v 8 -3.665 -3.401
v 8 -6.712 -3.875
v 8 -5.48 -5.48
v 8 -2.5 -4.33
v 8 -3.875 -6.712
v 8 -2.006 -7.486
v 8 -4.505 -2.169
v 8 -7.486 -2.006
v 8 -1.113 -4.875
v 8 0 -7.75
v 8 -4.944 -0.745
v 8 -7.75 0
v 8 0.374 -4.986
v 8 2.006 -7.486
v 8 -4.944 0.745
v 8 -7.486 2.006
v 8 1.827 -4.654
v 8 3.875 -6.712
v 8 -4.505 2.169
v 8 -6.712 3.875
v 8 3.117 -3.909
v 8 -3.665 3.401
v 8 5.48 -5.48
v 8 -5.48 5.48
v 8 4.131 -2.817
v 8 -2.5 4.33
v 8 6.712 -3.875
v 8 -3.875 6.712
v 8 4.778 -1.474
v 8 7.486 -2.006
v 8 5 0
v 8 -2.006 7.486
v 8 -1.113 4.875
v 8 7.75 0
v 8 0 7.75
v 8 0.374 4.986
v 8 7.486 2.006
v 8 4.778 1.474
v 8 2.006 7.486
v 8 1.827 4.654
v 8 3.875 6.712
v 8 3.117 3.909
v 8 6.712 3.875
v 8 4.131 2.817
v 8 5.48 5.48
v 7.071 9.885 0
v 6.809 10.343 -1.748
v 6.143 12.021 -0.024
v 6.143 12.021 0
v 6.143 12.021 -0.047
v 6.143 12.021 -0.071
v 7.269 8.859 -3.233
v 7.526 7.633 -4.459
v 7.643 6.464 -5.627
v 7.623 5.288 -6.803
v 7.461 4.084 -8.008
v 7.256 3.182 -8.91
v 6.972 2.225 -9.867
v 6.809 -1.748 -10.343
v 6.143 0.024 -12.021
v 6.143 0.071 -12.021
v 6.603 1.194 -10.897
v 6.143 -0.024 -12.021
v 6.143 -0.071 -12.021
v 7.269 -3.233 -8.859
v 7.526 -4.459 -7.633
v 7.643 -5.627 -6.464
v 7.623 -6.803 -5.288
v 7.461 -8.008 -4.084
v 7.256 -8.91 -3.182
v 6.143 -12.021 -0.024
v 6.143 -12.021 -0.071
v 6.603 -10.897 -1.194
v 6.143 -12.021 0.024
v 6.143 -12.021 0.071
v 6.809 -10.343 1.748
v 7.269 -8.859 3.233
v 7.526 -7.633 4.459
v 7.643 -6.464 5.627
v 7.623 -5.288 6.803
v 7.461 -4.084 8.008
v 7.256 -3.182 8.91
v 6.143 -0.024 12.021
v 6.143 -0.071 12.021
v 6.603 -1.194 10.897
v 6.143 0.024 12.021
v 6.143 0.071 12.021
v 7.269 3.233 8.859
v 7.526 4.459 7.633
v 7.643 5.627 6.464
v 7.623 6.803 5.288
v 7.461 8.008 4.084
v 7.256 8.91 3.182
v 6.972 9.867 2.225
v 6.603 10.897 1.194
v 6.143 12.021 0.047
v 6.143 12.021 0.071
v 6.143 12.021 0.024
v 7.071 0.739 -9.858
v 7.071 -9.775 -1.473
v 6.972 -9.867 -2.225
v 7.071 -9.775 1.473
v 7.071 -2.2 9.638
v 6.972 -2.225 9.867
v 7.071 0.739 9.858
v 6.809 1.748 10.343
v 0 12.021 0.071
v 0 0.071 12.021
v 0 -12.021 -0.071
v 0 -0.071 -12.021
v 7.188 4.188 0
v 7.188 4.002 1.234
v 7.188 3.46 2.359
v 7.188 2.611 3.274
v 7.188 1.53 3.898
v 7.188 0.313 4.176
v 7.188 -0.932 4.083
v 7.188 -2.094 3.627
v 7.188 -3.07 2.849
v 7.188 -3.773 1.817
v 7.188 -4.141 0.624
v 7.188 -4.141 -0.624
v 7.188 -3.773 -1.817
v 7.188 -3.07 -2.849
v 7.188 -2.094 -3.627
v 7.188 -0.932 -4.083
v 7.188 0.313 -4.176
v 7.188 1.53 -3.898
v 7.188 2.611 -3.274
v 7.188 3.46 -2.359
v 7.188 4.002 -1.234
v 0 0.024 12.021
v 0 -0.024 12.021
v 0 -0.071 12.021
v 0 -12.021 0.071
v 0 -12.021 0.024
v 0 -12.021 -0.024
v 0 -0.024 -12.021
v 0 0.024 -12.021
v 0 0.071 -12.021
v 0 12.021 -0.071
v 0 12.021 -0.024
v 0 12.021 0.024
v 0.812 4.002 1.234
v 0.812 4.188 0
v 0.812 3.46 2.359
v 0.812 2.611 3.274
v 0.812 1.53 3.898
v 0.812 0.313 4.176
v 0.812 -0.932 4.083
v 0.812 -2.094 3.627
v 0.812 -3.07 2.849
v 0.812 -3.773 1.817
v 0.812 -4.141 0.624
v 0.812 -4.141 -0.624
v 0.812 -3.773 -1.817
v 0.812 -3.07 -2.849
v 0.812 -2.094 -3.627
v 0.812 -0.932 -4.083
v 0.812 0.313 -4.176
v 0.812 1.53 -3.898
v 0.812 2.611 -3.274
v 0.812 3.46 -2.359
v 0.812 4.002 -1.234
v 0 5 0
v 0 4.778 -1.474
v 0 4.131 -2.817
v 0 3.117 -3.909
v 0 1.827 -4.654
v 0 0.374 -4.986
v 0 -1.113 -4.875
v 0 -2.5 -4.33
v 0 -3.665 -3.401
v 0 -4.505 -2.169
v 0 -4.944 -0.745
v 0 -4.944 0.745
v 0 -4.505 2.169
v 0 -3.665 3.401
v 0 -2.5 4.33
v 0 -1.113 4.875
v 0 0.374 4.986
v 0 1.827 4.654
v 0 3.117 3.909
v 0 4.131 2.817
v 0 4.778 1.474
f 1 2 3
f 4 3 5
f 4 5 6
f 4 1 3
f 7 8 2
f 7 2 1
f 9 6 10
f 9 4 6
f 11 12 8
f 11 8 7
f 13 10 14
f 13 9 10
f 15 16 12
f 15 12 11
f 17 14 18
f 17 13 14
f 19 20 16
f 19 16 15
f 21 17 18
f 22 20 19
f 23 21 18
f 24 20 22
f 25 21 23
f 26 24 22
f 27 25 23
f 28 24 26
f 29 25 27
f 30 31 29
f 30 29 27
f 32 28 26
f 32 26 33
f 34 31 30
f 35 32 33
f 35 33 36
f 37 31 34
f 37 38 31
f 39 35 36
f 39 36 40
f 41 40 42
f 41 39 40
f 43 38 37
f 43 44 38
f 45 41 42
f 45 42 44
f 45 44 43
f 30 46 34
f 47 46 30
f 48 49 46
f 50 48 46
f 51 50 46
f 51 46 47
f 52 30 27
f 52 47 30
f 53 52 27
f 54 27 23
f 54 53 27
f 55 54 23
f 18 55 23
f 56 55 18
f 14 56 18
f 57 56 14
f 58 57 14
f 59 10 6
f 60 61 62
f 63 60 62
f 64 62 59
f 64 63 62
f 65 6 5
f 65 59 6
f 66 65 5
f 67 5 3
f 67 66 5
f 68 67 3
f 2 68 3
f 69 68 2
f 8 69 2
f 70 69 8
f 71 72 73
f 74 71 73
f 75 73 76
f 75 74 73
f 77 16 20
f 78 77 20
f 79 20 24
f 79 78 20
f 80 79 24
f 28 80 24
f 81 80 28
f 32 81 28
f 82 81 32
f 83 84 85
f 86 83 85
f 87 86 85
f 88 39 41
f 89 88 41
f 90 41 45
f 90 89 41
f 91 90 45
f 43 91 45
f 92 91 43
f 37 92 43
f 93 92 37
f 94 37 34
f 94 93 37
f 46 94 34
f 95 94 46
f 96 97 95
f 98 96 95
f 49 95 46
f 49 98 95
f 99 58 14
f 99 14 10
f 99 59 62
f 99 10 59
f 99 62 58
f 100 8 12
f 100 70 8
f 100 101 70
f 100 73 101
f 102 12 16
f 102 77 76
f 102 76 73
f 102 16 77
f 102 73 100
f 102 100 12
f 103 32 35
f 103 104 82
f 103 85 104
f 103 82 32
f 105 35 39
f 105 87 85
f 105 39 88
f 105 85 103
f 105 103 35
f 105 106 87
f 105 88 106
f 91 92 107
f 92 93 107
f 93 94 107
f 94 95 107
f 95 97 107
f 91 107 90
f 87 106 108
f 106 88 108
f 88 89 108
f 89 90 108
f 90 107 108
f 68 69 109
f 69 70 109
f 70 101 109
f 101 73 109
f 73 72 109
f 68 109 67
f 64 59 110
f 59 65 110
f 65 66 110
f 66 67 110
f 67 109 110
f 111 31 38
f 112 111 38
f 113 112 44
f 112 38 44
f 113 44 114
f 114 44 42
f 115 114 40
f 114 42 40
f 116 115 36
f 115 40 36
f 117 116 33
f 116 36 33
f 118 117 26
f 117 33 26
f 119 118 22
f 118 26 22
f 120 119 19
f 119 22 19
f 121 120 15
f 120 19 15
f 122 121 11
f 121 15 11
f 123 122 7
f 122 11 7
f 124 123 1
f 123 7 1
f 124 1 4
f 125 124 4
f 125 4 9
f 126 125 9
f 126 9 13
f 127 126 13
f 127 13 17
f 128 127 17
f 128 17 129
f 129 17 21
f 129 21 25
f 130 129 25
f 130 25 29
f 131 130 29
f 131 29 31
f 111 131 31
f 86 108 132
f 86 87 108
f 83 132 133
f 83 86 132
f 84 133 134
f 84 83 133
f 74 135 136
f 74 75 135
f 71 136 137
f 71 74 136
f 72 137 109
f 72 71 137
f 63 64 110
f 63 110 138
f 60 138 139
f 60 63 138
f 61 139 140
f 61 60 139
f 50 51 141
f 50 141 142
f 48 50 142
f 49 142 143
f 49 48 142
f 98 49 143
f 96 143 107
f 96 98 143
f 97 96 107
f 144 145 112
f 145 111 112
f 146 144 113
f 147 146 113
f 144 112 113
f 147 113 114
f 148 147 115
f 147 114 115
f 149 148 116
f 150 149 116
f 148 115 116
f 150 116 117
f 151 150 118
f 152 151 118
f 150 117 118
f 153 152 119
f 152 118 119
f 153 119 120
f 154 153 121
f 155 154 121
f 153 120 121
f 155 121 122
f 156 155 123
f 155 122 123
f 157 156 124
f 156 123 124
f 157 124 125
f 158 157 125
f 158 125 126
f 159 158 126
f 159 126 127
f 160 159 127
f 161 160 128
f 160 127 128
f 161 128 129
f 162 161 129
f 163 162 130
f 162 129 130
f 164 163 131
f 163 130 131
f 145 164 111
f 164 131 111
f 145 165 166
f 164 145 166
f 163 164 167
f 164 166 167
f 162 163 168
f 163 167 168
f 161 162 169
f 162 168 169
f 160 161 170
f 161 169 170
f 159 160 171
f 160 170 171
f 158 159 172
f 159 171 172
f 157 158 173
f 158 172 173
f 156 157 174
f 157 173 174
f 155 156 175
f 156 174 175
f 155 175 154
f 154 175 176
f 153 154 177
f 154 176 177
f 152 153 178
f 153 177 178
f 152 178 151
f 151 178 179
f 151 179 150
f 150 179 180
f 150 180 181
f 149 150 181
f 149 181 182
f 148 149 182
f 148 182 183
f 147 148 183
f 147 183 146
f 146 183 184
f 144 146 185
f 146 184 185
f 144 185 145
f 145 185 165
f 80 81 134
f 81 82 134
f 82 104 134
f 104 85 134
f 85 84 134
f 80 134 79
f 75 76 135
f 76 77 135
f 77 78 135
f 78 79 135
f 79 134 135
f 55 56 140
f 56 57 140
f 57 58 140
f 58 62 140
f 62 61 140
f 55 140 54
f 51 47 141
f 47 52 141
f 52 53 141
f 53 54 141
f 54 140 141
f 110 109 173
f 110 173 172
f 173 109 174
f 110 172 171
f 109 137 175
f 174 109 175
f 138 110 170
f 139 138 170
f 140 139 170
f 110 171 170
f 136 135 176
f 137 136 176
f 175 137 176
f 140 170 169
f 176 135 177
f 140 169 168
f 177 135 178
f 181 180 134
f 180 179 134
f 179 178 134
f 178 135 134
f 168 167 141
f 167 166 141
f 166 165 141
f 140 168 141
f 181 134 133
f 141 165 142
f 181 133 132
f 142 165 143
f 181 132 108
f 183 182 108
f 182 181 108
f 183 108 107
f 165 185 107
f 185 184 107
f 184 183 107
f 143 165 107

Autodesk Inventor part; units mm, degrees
sketch "Sketch_2" plane through (0, 0, 0) normal (0, 0, 1) x (1, 0, 0)
  line L0 (8, 0) -> (0, 0)
  line L1 (0, 0) -> (0, 12.0208)
  line L2 (0, 12.0208) -> (6.143, 12.0208)
  line L3 (6.143, 12.0208) -> (8, 7.75)
  line L4 (8, 7.75) -> (8, 0)
  line L5 (8, 0) -> (0, 0)
revolve "Revolution1" add sketch "Sketch_2" angle 360 about axis through (8, 0, 0) along (1, 0, 0)
sketch "Skizze_2" plane through (0, 0, 0) normal (1, 0, 0) x (0, 1, 0)
  line L0 (34, 34) -> (-34, 34)
  line L1 (-34, 34) -> (-34, -34)
  line L2 (-34, -34) -> (34, -34)
  line L3 (34, -34) -> (34, 34)
  line L4 (0, 12.0915) -> (-12.0915, 0)
  line L5 (-12.0915, 0) -> (0, -12.0915)
  line L6 (0, -12.0915) -> (12.0915, 0)
  line L7 (12.0915, 0) -> (0, 12.0915)
extrude "Extrusion1" cut sketch "Skizze_2" along normal blind 8
sketch "Sketch_1" plane through (0, 0, 0) normal (0, 0, 1) x (1, 0, 0)
  line L0 (8, 0) -> (0, 0)
  line L1 (0, 0) -> (0, 5)
  line L2 (0, 5) -> (0.812, 4.188)
  line L3 (0.812, 4.188) -> (7.188, 4.188)
  line L4 (7.188, 4.188) -> (8, 5)
  line L5 (8, 5) -> (8, 0)
  line L6 (8, 0) -> (0, 0)
revolve "Revolution2" cut sketch "Sketch_1" angle 360 about axis through (8, 0, 0) along (1, 0, 0)
thread "Thread1" size "M10x1.5" class "6H" standard "ISO Metric profile" full length
ref_plane "IP1_XY" through (0, 0, 0) normal (1, 0, 0) x (0, 0, -1)
ref_plane "IP1_YZ" through (0, 0, 0) normal (0, 0, -1) x (0, 1, 0)
ref_plane "IP1_ZX" through (0, 0, 0) normal (0, 1, 0) x (1, 0, 0)
ref_plane "IP2_XY" through (8, 0, 0) normal (1, 0, 0) x (0, 0, -1)
ref_plane "IP2_YZ" through (8, 0, 0) normal (0, 0, -1) x (0, 1, 0)
ref_plane "IP2_ZX" through (8, 0, 0) normal (0, 1, 0) x (1, 0, 0)
properties part number "DIN 557 - M10"
